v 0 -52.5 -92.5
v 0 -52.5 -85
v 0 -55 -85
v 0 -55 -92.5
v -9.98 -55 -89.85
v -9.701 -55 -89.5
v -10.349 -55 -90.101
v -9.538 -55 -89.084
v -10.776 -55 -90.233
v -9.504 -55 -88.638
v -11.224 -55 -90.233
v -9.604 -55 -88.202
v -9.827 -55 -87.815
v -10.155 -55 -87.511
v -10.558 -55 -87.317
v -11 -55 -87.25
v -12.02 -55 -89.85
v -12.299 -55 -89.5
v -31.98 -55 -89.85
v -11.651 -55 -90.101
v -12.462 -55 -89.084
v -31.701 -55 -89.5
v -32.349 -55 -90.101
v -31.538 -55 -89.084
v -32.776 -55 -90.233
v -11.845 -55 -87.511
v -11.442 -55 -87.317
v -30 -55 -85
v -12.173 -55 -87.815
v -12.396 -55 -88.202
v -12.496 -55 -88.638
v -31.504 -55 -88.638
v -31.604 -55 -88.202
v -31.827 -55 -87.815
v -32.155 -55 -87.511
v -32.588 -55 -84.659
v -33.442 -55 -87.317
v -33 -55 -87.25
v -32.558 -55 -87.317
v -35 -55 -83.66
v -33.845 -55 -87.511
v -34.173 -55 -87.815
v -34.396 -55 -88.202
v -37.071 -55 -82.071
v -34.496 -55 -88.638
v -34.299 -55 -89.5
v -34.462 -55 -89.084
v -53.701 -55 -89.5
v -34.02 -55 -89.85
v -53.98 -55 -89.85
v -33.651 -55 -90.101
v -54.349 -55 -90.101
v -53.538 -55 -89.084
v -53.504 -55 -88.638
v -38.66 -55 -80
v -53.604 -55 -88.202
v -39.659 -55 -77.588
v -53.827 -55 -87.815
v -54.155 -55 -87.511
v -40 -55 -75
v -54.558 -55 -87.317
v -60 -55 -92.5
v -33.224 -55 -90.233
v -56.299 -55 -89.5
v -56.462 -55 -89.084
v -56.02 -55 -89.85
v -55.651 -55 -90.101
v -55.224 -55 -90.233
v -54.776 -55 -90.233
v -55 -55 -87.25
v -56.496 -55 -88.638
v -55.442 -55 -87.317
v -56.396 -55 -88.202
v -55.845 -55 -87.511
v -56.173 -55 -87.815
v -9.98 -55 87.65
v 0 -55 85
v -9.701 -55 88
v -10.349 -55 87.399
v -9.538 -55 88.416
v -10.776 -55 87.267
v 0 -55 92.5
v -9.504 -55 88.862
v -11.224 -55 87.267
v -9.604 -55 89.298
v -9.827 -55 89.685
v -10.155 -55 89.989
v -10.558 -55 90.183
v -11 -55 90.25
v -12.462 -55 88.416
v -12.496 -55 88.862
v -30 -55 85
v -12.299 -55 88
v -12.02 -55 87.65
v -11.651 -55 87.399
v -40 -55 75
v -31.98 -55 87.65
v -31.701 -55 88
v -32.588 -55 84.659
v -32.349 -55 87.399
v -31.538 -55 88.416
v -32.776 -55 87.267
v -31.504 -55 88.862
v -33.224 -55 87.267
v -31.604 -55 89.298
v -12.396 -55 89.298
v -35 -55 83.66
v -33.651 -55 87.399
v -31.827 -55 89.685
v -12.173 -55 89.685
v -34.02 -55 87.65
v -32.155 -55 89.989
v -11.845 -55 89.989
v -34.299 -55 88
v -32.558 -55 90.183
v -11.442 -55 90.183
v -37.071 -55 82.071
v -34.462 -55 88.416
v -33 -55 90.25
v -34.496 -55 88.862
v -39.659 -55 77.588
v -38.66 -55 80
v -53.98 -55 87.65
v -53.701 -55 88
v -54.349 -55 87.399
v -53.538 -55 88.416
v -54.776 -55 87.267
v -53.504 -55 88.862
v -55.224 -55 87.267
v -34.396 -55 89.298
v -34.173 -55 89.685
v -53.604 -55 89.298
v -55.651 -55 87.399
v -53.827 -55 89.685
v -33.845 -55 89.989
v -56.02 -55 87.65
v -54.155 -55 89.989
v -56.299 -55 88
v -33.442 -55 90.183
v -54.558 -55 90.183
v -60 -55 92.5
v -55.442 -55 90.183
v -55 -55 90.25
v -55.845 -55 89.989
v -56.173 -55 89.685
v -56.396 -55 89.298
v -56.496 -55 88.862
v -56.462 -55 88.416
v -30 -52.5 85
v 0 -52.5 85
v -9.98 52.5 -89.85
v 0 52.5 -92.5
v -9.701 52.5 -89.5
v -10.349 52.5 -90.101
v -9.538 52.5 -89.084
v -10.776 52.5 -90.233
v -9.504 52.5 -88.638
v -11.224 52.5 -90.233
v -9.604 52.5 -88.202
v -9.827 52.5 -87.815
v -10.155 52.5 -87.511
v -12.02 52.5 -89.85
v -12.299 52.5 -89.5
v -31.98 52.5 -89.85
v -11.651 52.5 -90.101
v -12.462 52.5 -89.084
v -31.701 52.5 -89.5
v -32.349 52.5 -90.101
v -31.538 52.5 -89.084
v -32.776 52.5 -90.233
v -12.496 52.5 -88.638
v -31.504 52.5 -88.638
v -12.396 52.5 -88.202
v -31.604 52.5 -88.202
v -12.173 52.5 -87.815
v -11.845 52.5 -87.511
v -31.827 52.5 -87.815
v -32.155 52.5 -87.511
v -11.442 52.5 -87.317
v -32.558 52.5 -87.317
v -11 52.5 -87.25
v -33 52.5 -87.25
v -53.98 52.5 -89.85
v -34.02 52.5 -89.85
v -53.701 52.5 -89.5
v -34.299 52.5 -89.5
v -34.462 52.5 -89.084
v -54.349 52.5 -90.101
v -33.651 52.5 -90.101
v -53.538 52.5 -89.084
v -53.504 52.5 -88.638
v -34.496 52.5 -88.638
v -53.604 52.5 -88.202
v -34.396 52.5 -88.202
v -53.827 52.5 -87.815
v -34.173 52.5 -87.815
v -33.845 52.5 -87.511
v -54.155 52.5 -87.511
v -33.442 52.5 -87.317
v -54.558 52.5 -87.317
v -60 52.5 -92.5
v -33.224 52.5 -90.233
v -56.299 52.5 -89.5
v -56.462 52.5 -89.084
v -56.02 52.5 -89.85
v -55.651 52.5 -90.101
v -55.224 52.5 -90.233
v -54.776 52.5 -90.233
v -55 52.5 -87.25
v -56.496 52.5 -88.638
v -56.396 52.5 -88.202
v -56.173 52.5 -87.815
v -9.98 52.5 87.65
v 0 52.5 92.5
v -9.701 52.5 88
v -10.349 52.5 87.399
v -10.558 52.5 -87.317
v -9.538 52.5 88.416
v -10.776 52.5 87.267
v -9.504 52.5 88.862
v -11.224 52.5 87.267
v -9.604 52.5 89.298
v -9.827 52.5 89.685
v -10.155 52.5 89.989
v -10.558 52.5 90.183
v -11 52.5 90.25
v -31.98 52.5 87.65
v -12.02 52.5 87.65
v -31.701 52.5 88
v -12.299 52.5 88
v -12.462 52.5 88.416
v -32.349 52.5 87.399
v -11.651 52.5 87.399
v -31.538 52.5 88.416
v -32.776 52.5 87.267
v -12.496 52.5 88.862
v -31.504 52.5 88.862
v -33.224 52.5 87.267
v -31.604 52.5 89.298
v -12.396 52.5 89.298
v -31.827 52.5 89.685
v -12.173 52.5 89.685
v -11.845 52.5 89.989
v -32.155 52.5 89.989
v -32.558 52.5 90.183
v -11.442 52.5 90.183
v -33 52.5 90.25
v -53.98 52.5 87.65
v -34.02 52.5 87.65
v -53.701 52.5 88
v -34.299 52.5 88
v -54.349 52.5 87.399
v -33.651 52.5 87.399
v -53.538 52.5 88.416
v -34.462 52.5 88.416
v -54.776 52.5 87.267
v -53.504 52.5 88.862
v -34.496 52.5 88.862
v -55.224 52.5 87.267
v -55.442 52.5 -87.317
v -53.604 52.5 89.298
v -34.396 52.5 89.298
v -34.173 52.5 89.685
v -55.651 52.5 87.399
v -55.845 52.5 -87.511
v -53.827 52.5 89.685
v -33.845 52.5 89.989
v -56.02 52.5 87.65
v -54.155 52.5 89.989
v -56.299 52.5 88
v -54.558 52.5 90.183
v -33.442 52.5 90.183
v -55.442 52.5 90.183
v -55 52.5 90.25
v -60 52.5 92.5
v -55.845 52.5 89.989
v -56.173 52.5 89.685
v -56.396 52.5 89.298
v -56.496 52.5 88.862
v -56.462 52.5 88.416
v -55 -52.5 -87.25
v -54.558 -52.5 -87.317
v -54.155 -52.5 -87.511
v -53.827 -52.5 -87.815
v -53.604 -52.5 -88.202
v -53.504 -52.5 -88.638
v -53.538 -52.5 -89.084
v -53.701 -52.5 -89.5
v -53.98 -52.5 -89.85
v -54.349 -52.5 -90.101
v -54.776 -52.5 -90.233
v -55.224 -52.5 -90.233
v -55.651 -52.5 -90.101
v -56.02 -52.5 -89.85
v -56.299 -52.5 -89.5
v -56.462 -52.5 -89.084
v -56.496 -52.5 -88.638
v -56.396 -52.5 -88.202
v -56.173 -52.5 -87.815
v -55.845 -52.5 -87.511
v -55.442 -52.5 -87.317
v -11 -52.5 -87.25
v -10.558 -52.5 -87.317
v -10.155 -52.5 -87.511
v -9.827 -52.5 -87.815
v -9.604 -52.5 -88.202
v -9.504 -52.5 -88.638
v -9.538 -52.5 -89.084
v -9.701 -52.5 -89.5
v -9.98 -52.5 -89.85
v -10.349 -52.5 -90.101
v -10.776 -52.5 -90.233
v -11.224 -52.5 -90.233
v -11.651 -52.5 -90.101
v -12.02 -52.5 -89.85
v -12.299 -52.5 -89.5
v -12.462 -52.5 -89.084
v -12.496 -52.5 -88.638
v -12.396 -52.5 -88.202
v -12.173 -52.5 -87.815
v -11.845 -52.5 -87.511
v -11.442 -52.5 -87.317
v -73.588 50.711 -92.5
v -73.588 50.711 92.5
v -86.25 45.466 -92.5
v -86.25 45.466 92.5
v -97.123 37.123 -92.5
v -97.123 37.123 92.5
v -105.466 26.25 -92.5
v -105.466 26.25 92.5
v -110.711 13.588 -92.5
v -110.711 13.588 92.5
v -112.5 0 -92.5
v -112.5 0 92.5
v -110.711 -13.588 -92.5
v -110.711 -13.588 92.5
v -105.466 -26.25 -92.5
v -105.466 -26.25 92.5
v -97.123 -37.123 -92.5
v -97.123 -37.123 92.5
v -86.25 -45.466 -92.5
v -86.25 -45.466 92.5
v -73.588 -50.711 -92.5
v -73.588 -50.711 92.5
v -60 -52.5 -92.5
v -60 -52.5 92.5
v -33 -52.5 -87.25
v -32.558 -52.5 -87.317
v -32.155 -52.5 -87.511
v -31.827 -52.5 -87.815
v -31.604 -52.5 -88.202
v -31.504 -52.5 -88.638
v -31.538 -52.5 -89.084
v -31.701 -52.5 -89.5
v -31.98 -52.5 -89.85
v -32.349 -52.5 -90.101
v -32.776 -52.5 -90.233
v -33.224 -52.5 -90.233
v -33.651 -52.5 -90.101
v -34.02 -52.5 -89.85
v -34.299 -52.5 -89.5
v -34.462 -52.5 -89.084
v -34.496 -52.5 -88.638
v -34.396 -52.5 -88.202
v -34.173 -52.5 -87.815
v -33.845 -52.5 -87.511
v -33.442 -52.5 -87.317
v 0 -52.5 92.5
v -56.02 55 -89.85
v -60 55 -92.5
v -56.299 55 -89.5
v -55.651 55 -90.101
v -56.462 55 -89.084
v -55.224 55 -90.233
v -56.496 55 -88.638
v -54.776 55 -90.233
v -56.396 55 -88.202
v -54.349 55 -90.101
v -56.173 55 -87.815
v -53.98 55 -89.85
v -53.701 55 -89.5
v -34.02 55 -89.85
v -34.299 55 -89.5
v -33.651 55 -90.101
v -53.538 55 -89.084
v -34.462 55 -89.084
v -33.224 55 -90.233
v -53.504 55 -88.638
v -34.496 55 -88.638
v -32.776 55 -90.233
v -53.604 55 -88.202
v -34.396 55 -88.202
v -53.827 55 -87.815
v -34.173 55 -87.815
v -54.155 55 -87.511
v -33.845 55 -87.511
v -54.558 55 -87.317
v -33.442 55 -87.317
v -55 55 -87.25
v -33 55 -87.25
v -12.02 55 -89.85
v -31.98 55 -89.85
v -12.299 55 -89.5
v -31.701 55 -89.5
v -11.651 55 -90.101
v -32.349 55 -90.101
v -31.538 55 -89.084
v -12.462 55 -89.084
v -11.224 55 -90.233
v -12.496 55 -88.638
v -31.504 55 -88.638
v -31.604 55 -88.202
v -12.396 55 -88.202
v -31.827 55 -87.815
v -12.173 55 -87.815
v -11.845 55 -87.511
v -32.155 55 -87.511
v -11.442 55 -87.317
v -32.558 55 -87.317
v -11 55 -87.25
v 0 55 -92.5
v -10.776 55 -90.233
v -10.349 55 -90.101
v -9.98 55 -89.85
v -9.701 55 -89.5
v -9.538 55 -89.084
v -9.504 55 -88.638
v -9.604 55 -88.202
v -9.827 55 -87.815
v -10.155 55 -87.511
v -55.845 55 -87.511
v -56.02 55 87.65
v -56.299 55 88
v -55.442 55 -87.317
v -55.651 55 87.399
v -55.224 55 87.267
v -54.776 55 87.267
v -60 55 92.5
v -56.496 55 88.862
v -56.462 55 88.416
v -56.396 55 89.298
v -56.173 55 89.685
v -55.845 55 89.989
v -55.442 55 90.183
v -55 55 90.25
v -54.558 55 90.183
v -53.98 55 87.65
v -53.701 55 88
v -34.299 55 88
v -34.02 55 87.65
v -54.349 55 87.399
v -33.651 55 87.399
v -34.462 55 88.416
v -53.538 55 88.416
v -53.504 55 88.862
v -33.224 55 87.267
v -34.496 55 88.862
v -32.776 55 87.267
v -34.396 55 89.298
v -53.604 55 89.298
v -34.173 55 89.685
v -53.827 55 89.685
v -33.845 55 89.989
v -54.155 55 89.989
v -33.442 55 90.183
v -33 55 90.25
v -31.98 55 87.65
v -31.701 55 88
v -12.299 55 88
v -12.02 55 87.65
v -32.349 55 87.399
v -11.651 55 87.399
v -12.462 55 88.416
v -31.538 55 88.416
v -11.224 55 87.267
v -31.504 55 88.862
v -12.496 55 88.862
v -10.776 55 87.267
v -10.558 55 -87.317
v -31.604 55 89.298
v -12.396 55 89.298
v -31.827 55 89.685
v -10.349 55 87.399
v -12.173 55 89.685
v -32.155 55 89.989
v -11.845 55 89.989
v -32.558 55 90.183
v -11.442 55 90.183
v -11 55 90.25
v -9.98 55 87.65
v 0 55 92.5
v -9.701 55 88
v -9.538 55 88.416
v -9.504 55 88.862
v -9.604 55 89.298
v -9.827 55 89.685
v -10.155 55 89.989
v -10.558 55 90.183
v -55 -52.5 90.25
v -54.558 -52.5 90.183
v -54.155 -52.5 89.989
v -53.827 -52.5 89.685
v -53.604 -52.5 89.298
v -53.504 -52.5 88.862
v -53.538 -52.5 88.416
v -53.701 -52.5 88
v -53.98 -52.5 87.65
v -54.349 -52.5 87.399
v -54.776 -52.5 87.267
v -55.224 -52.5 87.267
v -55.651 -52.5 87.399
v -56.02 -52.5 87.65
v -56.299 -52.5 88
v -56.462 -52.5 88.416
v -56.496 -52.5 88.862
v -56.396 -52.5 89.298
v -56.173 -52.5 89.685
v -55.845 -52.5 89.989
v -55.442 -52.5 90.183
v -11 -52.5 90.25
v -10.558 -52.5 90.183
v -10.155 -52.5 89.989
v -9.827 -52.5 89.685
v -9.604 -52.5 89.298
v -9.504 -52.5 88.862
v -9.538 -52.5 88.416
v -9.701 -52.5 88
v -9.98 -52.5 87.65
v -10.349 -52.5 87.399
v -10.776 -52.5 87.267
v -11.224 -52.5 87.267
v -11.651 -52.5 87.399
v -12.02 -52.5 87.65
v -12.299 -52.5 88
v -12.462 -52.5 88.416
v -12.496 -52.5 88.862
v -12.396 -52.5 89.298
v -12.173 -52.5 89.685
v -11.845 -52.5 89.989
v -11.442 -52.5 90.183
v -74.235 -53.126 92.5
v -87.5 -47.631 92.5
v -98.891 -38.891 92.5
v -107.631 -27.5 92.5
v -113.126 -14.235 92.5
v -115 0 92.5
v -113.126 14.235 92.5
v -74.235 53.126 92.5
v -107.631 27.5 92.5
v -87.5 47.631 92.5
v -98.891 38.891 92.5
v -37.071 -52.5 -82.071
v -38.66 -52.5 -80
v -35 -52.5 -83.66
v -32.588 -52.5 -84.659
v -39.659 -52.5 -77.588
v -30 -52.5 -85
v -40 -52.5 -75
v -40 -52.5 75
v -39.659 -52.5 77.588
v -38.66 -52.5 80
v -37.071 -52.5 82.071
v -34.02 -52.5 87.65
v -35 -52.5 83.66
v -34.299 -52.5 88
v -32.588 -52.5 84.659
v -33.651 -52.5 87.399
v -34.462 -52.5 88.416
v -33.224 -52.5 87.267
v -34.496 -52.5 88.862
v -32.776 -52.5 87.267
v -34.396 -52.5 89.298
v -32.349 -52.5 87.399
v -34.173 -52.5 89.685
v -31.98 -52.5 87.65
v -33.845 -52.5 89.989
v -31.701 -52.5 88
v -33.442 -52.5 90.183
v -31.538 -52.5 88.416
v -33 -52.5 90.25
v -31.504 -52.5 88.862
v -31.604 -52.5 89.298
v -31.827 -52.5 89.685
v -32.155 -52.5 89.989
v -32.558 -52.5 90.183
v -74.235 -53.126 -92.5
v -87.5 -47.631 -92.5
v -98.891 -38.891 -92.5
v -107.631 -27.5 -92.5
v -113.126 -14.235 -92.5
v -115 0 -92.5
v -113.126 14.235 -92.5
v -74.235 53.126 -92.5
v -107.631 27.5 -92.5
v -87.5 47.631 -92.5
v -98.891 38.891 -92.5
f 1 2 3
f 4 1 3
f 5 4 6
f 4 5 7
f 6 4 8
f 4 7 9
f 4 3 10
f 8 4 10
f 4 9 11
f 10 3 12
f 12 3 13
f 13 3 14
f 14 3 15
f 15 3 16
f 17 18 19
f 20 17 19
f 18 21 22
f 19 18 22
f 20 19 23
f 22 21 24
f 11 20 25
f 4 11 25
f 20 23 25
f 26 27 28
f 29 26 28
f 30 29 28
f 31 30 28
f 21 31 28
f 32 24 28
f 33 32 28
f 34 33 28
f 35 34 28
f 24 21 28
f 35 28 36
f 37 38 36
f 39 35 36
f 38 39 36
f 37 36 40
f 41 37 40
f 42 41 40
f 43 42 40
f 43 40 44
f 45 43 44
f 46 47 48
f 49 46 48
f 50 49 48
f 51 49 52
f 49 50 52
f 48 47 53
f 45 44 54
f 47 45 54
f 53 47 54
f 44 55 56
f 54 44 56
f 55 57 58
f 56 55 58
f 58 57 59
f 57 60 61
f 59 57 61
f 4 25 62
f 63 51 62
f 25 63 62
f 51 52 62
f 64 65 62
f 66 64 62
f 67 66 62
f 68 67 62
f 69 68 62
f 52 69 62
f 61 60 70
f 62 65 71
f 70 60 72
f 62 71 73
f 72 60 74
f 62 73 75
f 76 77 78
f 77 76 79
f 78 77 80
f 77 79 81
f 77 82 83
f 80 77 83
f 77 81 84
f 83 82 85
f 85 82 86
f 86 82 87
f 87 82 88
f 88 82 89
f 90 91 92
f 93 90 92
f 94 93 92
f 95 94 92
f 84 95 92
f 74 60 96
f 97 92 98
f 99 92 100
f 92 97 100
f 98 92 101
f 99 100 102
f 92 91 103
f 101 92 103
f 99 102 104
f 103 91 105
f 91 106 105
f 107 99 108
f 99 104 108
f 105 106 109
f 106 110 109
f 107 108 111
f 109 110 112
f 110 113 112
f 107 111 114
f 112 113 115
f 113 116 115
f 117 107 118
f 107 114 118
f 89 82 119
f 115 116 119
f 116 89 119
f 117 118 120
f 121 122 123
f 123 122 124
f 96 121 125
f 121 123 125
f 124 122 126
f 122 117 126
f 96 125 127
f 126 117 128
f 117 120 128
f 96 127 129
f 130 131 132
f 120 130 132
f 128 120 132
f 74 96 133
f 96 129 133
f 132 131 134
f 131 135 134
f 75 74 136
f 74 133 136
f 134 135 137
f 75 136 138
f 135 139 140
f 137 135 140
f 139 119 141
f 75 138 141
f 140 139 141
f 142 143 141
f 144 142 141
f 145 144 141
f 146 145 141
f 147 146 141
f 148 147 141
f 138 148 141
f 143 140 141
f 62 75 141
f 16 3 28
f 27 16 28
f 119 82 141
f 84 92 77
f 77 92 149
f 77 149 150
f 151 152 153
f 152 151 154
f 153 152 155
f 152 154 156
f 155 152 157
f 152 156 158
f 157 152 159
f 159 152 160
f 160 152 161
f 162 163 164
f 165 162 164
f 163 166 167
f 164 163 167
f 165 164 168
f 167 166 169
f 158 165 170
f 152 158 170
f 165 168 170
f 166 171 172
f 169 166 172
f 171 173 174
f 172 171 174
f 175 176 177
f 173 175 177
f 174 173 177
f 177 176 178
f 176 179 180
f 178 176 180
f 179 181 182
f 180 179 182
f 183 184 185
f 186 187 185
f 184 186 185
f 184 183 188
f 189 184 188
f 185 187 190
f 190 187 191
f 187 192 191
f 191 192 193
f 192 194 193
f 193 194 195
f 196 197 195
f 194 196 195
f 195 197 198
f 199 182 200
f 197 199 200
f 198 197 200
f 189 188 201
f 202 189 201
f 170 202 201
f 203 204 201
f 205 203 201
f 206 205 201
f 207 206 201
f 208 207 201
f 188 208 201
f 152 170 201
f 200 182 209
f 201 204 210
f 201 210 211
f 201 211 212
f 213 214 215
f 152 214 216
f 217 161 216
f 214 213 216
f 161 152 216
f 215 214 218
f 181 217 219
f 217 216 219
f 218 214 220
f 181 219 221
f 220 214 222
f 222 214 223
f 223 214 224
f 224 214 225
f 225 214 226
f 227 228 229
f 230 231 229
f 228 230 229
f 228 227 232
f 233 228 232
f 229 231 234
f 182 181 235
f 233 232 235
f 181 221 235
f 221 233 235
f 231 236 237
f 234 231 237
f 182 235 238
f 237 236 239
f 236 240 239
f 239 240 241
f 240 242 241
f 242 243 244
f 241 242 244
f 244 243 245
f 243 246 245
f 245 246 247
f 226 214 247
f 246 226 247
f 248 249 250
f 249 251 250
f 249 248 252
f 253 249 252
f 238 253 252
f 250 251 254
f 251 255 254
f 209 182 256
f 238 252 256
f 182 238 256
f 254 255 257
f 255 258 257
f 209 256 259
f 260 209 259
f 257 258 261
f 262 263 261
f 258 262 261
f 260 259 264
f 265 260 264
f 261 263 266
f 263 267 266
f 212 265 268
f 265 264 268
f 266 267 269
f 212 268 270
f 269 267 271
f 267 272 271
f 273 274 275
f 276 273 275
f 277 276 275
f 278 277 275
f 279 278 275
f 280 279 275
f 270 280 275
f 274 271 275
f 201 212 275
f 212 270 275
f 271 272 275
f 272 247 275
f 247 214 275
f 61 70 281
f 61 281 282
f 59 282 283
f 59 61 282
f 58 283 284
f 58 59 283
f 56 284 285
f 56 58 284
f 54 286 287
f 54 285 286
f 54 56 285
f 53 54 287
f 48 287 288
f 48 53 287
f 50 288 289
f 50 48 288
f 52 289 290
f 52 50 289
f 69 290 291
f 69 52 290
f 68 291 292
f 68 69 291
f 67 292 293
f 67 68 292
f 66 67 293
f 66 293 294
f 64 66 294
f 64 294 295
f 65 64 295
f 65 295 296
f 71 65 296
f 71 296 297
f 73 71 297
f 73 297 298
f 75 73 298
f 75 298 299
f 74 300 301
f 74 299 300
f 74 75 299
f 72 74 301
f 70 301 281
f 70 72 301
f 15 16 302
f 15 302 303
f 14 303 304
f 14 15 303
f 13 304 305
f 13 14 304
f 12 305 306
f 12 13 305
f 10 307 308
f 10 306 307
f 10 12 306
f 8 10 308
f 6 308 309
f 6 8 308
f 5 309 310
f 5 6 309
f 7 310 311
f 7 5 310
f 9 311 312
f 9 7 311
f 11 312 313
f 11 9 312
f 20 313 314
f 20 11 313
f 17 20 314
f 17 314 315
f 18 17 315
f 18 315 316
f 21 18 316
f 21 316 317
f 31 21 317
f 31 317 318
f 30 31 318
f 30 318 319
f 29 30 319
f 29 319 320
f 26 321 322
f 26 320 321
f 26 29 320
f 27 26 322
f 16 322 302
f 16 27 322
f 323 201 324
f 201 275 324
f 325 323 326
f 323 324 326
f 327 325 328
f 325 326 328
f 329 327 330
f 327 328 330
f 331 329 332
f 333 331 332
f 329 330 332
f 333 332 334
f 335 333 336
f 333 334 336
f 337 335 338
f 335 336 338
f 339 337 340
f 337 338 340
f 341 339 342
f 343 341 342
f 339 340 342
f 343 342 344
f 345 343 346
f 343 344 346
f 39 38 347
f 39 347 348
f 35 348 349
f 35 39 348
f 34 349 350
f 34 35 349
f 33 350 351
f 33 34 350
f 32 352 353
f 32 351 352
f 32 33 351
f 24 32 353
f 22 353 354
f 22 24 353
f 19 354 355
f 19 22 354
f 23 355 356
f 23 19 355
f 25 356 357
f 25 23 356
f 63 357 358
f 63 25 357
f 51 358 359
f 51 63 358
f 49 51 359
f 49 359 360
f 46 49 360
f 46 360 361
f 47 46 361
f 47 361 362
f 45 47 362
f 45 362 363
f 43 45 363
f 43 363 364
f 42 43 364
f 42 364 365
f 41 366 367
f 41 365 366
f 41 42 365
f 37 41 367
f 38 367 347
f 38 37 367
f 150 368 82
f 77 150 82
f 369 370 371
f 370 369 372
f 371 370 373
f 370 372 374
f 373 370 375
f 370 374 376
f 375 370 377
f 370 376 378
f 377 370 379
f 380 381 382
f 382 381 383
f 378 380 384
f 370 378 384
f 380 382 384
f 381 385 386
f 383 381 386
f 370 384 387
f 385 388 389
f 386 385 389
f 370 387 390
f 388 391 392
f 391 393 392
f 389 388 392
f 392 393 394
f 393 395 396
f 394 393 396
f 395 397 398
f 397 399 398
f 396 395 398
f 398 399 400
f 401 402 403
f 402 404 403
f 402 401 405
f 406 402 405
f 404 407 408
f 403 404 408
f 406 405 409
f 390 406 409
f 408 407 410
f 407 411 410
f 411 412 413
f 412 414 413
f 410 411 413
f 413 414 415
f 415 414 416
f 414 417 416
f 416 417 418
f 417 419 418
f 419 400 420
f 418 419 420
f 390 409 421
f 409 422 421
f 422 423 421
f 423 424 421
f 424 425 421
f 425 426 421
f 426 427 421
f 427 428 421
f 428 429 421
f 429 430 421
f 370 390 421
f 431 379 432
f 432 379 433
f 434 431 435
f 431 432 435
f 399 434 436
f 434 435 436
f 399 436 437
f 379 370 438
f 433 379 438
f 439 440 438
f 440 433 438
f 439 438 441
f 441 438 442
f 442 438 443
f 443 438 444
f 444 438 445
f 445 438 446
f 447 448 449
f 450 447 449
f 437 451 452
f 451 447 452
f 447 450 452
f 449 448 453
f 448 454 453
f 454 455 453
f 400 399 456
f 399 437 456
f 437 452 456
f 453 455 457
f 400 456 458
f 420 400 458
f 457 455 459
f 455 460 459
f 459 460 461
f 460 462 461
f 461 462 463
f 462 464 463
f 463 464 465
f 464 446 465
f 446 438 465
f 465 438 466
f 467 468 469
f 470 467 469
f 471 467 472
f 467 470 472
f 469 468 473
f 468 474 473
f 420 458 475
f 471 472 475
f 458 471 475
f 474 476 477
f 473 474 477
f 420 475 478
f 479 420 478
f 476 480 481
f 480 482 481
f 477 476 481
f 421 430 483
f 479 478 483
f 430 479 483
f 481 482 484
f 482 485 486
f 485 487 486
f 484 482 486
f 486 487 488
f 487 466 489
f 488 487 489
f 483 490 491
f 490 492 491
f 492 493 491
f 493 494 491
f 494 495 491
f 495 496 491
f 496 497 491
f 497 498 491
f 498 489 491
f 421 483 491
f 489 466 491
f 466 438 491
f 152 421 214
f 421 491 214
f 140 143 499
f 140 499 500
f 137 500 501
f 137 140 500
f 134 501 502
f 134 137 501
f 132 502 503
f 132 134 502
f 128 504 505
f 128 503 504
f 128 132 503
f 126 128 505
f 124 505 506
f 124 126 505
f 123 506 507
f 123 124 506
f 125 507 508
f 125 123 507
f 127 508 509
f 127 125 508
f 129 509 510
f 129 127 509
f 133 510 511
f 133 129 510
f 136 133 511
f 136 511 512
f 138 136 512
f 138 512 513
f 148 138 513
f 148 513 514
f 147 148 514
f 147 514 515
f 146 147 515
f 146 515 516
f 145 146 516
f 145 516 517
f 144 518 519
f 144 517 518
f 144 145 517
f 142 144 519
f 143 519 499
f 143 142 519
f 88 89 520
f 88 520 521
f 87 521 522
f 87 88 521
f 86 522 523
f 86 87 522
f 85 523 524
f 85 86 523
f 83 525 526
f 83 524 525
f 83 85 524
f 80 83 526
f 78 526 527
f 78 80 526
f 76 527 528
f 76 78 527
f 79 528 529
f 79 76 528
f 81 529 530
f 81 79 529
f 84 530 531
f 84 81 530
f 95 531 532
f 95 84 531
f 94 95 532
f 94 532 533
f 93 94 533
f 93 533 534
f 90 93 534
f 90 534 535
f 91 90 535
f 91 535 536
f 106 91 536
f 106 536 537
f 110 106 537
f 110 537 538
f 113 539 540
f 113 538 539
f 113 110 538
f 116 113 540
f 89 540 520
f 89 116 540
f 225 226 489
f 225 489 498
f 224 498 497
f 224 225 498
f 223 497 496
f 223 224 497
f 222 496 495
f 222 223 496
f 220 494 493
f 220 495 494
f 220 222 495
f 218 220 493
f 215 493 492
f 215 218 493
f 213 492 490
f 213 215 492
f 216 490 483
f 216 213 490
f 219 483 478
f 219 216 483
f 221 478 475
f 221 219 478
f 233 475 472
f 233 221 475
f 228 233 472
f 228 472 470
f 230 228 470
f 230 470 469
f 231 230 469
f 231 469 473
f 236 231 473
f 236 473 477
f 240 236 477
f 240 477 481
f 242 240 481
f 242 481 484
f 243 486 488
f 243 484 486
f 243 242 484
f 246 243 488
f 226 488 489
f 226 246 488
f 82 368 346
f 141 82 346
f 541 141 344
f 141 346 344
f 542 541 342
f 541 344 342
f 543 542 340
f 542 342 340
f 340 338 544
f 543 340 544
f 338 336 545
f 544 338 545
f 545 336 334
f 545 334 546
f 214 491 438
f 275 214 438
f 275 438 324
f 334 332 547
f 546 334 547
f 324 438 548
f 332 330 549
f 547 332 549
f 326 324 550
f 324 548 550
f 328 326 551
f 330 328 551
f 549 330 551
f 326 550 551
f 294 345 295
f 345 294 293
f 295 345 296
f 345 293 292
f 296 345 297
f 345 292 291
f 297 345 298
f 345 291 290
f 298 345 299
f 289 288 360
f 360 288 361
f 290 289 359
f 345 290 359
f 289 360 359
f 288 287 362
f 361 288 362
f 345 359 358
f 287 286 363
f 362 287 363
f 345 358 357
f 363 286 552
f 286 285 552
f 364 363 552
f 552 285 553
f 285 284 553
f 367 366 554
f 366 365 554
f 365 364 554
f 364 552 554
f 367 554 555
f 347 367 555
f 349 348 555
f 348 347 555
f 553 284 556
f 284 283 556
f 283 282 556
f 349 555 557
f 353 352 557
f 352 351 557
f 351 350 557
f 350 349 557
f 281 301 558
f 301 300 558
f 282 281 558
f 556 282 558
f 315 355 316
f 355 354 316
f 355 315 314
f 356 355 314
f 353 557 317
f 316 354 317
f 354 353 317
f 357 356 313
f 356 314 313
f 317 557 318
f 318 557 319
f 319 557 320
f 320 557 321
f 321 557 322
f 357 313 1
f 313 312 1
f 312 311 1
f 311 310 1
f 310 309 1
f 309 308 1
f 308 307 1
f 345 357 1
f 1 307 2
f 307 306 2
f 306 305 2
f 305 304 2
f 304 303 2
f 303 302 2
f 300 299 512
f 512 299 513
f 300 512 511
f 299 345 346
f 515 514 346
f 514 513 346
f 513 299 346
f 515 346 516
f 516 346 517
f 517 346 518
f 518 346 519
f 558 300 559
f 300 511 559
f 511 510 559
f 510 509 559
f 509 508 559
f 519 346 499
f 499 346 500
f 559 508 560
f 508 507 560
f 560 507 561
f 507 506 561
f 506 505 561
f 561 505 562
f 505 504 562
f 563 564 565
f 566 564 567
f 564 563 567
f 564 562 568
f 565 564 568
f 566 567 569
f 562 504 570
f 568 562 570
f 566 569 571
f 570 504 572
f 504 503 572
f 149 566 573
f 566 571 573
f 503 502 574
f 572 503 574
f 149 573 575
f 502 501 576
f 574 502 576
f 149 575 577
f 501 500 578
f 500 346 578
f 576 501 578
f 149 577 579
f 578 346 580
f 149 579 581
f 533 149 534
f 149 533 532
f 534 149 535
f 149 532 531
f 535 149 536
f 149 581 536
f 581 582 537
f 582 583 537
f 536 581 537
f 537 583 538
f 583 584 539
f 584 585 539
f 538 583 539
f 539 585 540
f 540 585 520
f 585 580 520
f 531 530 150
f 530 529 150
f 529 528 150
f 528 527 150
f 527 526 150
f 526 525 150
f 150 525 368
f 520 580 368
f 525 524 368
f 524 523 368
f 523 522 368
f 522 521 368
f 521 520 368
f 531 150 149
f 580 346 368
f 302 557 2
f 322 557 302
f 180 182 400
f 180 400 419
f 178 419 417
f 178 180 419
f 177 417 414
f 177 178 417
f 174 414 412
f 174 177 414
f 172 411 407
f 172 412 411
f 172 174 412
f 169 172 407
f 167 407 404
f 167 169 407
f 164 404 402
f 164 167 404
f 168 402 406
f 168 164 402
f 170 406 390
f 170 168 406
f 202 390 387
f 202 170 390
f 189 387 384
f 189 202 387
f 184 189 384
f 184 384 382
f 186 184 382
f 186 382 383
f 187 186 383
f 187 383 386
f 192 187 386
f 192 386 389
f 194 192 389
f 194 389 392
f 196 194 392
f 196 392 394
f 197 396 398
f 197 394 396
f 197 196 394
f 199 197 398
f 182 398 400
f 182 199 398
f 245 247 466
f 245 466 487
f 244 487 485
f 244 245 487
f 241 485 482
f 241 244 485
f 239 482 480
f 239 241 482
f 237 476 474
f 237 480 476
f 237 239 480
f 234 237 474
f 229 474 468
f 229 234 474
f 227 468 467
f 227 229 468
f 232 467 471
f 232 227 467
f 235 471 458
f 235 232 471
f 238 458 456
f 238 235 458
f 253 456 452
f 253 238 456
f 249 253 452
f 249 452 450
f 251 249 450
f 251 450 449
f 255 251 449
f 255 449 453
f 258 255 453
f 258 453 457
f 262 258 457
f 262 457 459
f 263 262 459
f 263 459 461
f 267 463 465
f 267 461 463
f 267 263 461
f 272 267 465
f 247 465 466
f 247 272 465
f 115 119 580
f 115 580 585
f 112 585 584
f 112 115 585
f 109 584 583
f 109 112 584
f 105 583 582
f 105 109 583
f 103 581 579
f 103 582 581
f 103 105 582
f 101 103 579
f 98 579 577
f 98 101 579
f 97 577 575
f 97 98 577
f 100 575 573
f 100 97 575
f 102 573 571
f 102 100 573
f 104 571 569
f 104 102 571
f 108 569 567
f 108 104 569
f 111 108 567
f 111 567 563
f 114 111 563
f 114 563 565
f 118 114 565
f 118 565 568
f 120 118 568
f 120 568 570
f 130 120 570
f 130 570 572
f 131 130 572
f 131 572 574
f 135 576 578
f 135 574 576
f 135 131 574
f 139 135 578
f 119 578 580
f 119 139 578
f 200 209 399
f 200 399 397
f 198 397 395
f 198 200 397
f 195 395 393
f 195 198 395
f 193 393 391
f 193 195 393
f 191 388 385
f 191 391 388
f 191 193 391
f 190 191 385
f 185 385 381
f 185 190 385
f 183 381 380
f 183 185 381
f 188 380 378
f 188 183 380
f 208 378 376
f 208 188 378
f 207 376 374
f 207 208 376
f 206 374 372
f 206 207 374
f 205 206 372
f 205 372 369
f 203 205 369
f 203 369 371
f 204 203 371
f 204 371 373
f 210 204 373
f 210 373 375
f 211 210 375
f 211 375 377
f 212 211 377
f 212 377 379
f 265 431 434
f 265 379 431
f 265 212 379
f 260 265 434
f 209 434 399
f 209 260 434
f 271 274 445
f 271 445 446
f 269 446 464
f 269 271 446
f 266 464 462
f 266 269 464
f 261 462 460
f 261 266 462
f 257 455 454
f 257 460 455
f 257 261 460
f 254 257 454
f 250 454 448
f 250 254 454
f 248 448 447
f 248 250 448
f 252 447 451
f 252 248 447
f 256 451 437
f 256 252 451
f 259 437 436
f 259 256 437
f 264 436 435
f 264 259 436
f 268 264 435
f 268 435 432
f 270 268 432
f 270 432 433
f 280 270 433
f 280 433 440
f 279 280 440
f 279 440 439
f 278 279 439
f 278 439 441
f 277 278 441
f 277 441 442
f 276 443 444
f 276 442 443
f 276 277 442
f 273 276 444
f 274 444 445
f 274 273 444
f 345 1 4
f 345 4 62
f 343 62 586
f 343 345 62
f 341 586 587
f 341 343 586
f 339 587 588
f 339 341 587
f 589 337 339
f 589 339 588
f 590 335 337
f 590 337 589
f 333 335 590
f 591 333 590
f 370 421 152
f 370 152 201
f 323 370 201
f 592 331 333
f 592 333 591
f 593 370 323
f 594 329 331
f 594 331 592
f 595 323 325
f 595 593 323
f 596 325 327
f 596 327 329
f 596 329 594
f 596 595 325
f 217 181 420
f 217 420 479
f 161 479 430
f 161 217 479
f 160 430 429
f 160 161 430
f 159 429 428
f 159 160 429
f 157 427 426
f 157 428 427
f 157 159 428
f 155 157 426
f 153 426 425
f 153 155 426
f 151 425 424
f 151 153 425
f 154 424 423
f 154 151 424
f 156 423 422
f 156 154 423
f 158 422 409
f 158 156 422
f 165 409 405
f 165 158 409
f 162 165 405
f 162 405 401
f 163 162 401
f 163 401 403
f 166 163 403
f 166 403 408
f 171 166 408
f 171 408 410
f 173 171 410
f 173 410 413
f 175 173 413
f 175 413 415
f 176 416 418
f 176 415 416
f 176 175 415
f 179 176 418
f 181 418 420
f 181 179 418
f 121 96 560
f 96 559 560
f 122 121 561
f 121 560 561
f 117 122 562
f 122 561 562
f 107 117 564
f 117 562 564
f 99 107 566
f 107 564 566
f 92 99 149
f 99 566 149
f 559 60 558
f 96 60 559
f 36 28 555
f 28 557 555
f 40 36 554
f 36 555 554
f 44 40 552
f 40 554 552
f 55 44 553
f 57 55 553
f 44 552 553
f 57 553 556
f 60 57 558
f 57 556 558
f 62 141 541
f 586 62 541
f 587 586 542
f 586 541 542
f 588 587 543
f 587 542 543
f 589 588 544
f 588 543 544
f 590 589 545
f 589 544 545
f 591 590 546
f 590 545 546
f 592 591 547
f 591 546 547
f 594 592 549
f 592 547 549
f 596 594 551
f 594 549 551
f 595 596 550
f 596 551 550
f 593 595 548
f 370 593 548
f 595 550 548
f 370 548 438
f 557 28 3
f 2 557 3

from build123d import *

# Parameters (mm, degrees)
BOSS_EXTRUDE1_DEPTH     = 92.5
SKETCH2_W               = 80
SKETCH2_H               = 170
CUT_EXTRUDE1_DEPTH      = 2.5
FILLET1_R               = 10
CUT_EXTRUDE2_DEPTH      = 158.5
CUT_EXTRUDE2_DEPTH_BACK = 158.5
SKETCH3_R               = 1.5


with BuildPart() as part:
    # Sketch1 → Boss-Extrude1 (new, symmetric)
    with BuildSketch(Plane.XY):
        with BuildLine():
            Line((-60, 55), (0, 55))
            Line((0, 55), (0, 52.5))
            Line((0, 52.5), (-60, 52.5))
            ThreePointArc((-60, 52.5), (-112.5, 0), (-60, -52.5))
            Line((-60, -52.5), (0, -52.5))
            Line((0, -52.5), (0, -55))
            Line((0, -55), (-60, -55))
            ThreePointArc((-60, -55), (-115, 0), (-60, 55))
        make_face()
    extrude(amount=BOSS_EXTRUDE1_DEPTH, both=True)

    # Sketch2 → Cut-Extrude1 (cut)
    with BuildSketch(Plane.XZ.offset(55)):
        Rectangle(SKETCH2_W, SKETCH2_H)
    extrude(amount=-CUT_EXTRUDE1_DEPTH, mode=Mode.SUBTRACT)

    # Fillet1
    fillet1_edges = [part.edges().sort_by_distance(p)[0] for p in [
        (-40, -53.75, 85),
        (-40, -53.75, -85),
    ]]
    fillet(fillet1_edges, radius=FILLET1_R)

    # Sketch3 → Cut-Extrude2 (cut, two sides: drawn at the far end of the back side and taken through both)
    with BuildSketch(Plane(origin=(0, 0, 0), x_dir=(1, 0, 0), z_dir=(0, 1, 0)).offset(-CUT_EXTRUDE2_DEPTH_BACK)):
        with Locations(Location((-55, 88.75, 0), (0, 0, 270))):
            Circle(SKETCH3_R)
        with Locations(Location((-33, 88.75, 0), (0, 0, 270))):
            Circle(SKETCH3_R)
        with Locations(Location((-11, 88.75, 0), (0, 0, 270))):
            Circle(SKETCH3_R)
        with Locations(Location((-11, -88.75, 0), (0, 0, 270))):
            Circle(SKETCH3_R)
        with Locations(Location((-33, -88.75, 0), (0, 0, 270))):
            Circle(SKETCH3_R)
        with Locations(Location((-55, -88.75, 0), (0, 0, 270))):
            Circle(SKETCH3_R)
    extrude(amount=CUT_EXTRUDE2_DEPTH + CUT_EXTRUDE2_DEPTH_BACK, mode=Mode.SUBTRACT)


solid = part.part
